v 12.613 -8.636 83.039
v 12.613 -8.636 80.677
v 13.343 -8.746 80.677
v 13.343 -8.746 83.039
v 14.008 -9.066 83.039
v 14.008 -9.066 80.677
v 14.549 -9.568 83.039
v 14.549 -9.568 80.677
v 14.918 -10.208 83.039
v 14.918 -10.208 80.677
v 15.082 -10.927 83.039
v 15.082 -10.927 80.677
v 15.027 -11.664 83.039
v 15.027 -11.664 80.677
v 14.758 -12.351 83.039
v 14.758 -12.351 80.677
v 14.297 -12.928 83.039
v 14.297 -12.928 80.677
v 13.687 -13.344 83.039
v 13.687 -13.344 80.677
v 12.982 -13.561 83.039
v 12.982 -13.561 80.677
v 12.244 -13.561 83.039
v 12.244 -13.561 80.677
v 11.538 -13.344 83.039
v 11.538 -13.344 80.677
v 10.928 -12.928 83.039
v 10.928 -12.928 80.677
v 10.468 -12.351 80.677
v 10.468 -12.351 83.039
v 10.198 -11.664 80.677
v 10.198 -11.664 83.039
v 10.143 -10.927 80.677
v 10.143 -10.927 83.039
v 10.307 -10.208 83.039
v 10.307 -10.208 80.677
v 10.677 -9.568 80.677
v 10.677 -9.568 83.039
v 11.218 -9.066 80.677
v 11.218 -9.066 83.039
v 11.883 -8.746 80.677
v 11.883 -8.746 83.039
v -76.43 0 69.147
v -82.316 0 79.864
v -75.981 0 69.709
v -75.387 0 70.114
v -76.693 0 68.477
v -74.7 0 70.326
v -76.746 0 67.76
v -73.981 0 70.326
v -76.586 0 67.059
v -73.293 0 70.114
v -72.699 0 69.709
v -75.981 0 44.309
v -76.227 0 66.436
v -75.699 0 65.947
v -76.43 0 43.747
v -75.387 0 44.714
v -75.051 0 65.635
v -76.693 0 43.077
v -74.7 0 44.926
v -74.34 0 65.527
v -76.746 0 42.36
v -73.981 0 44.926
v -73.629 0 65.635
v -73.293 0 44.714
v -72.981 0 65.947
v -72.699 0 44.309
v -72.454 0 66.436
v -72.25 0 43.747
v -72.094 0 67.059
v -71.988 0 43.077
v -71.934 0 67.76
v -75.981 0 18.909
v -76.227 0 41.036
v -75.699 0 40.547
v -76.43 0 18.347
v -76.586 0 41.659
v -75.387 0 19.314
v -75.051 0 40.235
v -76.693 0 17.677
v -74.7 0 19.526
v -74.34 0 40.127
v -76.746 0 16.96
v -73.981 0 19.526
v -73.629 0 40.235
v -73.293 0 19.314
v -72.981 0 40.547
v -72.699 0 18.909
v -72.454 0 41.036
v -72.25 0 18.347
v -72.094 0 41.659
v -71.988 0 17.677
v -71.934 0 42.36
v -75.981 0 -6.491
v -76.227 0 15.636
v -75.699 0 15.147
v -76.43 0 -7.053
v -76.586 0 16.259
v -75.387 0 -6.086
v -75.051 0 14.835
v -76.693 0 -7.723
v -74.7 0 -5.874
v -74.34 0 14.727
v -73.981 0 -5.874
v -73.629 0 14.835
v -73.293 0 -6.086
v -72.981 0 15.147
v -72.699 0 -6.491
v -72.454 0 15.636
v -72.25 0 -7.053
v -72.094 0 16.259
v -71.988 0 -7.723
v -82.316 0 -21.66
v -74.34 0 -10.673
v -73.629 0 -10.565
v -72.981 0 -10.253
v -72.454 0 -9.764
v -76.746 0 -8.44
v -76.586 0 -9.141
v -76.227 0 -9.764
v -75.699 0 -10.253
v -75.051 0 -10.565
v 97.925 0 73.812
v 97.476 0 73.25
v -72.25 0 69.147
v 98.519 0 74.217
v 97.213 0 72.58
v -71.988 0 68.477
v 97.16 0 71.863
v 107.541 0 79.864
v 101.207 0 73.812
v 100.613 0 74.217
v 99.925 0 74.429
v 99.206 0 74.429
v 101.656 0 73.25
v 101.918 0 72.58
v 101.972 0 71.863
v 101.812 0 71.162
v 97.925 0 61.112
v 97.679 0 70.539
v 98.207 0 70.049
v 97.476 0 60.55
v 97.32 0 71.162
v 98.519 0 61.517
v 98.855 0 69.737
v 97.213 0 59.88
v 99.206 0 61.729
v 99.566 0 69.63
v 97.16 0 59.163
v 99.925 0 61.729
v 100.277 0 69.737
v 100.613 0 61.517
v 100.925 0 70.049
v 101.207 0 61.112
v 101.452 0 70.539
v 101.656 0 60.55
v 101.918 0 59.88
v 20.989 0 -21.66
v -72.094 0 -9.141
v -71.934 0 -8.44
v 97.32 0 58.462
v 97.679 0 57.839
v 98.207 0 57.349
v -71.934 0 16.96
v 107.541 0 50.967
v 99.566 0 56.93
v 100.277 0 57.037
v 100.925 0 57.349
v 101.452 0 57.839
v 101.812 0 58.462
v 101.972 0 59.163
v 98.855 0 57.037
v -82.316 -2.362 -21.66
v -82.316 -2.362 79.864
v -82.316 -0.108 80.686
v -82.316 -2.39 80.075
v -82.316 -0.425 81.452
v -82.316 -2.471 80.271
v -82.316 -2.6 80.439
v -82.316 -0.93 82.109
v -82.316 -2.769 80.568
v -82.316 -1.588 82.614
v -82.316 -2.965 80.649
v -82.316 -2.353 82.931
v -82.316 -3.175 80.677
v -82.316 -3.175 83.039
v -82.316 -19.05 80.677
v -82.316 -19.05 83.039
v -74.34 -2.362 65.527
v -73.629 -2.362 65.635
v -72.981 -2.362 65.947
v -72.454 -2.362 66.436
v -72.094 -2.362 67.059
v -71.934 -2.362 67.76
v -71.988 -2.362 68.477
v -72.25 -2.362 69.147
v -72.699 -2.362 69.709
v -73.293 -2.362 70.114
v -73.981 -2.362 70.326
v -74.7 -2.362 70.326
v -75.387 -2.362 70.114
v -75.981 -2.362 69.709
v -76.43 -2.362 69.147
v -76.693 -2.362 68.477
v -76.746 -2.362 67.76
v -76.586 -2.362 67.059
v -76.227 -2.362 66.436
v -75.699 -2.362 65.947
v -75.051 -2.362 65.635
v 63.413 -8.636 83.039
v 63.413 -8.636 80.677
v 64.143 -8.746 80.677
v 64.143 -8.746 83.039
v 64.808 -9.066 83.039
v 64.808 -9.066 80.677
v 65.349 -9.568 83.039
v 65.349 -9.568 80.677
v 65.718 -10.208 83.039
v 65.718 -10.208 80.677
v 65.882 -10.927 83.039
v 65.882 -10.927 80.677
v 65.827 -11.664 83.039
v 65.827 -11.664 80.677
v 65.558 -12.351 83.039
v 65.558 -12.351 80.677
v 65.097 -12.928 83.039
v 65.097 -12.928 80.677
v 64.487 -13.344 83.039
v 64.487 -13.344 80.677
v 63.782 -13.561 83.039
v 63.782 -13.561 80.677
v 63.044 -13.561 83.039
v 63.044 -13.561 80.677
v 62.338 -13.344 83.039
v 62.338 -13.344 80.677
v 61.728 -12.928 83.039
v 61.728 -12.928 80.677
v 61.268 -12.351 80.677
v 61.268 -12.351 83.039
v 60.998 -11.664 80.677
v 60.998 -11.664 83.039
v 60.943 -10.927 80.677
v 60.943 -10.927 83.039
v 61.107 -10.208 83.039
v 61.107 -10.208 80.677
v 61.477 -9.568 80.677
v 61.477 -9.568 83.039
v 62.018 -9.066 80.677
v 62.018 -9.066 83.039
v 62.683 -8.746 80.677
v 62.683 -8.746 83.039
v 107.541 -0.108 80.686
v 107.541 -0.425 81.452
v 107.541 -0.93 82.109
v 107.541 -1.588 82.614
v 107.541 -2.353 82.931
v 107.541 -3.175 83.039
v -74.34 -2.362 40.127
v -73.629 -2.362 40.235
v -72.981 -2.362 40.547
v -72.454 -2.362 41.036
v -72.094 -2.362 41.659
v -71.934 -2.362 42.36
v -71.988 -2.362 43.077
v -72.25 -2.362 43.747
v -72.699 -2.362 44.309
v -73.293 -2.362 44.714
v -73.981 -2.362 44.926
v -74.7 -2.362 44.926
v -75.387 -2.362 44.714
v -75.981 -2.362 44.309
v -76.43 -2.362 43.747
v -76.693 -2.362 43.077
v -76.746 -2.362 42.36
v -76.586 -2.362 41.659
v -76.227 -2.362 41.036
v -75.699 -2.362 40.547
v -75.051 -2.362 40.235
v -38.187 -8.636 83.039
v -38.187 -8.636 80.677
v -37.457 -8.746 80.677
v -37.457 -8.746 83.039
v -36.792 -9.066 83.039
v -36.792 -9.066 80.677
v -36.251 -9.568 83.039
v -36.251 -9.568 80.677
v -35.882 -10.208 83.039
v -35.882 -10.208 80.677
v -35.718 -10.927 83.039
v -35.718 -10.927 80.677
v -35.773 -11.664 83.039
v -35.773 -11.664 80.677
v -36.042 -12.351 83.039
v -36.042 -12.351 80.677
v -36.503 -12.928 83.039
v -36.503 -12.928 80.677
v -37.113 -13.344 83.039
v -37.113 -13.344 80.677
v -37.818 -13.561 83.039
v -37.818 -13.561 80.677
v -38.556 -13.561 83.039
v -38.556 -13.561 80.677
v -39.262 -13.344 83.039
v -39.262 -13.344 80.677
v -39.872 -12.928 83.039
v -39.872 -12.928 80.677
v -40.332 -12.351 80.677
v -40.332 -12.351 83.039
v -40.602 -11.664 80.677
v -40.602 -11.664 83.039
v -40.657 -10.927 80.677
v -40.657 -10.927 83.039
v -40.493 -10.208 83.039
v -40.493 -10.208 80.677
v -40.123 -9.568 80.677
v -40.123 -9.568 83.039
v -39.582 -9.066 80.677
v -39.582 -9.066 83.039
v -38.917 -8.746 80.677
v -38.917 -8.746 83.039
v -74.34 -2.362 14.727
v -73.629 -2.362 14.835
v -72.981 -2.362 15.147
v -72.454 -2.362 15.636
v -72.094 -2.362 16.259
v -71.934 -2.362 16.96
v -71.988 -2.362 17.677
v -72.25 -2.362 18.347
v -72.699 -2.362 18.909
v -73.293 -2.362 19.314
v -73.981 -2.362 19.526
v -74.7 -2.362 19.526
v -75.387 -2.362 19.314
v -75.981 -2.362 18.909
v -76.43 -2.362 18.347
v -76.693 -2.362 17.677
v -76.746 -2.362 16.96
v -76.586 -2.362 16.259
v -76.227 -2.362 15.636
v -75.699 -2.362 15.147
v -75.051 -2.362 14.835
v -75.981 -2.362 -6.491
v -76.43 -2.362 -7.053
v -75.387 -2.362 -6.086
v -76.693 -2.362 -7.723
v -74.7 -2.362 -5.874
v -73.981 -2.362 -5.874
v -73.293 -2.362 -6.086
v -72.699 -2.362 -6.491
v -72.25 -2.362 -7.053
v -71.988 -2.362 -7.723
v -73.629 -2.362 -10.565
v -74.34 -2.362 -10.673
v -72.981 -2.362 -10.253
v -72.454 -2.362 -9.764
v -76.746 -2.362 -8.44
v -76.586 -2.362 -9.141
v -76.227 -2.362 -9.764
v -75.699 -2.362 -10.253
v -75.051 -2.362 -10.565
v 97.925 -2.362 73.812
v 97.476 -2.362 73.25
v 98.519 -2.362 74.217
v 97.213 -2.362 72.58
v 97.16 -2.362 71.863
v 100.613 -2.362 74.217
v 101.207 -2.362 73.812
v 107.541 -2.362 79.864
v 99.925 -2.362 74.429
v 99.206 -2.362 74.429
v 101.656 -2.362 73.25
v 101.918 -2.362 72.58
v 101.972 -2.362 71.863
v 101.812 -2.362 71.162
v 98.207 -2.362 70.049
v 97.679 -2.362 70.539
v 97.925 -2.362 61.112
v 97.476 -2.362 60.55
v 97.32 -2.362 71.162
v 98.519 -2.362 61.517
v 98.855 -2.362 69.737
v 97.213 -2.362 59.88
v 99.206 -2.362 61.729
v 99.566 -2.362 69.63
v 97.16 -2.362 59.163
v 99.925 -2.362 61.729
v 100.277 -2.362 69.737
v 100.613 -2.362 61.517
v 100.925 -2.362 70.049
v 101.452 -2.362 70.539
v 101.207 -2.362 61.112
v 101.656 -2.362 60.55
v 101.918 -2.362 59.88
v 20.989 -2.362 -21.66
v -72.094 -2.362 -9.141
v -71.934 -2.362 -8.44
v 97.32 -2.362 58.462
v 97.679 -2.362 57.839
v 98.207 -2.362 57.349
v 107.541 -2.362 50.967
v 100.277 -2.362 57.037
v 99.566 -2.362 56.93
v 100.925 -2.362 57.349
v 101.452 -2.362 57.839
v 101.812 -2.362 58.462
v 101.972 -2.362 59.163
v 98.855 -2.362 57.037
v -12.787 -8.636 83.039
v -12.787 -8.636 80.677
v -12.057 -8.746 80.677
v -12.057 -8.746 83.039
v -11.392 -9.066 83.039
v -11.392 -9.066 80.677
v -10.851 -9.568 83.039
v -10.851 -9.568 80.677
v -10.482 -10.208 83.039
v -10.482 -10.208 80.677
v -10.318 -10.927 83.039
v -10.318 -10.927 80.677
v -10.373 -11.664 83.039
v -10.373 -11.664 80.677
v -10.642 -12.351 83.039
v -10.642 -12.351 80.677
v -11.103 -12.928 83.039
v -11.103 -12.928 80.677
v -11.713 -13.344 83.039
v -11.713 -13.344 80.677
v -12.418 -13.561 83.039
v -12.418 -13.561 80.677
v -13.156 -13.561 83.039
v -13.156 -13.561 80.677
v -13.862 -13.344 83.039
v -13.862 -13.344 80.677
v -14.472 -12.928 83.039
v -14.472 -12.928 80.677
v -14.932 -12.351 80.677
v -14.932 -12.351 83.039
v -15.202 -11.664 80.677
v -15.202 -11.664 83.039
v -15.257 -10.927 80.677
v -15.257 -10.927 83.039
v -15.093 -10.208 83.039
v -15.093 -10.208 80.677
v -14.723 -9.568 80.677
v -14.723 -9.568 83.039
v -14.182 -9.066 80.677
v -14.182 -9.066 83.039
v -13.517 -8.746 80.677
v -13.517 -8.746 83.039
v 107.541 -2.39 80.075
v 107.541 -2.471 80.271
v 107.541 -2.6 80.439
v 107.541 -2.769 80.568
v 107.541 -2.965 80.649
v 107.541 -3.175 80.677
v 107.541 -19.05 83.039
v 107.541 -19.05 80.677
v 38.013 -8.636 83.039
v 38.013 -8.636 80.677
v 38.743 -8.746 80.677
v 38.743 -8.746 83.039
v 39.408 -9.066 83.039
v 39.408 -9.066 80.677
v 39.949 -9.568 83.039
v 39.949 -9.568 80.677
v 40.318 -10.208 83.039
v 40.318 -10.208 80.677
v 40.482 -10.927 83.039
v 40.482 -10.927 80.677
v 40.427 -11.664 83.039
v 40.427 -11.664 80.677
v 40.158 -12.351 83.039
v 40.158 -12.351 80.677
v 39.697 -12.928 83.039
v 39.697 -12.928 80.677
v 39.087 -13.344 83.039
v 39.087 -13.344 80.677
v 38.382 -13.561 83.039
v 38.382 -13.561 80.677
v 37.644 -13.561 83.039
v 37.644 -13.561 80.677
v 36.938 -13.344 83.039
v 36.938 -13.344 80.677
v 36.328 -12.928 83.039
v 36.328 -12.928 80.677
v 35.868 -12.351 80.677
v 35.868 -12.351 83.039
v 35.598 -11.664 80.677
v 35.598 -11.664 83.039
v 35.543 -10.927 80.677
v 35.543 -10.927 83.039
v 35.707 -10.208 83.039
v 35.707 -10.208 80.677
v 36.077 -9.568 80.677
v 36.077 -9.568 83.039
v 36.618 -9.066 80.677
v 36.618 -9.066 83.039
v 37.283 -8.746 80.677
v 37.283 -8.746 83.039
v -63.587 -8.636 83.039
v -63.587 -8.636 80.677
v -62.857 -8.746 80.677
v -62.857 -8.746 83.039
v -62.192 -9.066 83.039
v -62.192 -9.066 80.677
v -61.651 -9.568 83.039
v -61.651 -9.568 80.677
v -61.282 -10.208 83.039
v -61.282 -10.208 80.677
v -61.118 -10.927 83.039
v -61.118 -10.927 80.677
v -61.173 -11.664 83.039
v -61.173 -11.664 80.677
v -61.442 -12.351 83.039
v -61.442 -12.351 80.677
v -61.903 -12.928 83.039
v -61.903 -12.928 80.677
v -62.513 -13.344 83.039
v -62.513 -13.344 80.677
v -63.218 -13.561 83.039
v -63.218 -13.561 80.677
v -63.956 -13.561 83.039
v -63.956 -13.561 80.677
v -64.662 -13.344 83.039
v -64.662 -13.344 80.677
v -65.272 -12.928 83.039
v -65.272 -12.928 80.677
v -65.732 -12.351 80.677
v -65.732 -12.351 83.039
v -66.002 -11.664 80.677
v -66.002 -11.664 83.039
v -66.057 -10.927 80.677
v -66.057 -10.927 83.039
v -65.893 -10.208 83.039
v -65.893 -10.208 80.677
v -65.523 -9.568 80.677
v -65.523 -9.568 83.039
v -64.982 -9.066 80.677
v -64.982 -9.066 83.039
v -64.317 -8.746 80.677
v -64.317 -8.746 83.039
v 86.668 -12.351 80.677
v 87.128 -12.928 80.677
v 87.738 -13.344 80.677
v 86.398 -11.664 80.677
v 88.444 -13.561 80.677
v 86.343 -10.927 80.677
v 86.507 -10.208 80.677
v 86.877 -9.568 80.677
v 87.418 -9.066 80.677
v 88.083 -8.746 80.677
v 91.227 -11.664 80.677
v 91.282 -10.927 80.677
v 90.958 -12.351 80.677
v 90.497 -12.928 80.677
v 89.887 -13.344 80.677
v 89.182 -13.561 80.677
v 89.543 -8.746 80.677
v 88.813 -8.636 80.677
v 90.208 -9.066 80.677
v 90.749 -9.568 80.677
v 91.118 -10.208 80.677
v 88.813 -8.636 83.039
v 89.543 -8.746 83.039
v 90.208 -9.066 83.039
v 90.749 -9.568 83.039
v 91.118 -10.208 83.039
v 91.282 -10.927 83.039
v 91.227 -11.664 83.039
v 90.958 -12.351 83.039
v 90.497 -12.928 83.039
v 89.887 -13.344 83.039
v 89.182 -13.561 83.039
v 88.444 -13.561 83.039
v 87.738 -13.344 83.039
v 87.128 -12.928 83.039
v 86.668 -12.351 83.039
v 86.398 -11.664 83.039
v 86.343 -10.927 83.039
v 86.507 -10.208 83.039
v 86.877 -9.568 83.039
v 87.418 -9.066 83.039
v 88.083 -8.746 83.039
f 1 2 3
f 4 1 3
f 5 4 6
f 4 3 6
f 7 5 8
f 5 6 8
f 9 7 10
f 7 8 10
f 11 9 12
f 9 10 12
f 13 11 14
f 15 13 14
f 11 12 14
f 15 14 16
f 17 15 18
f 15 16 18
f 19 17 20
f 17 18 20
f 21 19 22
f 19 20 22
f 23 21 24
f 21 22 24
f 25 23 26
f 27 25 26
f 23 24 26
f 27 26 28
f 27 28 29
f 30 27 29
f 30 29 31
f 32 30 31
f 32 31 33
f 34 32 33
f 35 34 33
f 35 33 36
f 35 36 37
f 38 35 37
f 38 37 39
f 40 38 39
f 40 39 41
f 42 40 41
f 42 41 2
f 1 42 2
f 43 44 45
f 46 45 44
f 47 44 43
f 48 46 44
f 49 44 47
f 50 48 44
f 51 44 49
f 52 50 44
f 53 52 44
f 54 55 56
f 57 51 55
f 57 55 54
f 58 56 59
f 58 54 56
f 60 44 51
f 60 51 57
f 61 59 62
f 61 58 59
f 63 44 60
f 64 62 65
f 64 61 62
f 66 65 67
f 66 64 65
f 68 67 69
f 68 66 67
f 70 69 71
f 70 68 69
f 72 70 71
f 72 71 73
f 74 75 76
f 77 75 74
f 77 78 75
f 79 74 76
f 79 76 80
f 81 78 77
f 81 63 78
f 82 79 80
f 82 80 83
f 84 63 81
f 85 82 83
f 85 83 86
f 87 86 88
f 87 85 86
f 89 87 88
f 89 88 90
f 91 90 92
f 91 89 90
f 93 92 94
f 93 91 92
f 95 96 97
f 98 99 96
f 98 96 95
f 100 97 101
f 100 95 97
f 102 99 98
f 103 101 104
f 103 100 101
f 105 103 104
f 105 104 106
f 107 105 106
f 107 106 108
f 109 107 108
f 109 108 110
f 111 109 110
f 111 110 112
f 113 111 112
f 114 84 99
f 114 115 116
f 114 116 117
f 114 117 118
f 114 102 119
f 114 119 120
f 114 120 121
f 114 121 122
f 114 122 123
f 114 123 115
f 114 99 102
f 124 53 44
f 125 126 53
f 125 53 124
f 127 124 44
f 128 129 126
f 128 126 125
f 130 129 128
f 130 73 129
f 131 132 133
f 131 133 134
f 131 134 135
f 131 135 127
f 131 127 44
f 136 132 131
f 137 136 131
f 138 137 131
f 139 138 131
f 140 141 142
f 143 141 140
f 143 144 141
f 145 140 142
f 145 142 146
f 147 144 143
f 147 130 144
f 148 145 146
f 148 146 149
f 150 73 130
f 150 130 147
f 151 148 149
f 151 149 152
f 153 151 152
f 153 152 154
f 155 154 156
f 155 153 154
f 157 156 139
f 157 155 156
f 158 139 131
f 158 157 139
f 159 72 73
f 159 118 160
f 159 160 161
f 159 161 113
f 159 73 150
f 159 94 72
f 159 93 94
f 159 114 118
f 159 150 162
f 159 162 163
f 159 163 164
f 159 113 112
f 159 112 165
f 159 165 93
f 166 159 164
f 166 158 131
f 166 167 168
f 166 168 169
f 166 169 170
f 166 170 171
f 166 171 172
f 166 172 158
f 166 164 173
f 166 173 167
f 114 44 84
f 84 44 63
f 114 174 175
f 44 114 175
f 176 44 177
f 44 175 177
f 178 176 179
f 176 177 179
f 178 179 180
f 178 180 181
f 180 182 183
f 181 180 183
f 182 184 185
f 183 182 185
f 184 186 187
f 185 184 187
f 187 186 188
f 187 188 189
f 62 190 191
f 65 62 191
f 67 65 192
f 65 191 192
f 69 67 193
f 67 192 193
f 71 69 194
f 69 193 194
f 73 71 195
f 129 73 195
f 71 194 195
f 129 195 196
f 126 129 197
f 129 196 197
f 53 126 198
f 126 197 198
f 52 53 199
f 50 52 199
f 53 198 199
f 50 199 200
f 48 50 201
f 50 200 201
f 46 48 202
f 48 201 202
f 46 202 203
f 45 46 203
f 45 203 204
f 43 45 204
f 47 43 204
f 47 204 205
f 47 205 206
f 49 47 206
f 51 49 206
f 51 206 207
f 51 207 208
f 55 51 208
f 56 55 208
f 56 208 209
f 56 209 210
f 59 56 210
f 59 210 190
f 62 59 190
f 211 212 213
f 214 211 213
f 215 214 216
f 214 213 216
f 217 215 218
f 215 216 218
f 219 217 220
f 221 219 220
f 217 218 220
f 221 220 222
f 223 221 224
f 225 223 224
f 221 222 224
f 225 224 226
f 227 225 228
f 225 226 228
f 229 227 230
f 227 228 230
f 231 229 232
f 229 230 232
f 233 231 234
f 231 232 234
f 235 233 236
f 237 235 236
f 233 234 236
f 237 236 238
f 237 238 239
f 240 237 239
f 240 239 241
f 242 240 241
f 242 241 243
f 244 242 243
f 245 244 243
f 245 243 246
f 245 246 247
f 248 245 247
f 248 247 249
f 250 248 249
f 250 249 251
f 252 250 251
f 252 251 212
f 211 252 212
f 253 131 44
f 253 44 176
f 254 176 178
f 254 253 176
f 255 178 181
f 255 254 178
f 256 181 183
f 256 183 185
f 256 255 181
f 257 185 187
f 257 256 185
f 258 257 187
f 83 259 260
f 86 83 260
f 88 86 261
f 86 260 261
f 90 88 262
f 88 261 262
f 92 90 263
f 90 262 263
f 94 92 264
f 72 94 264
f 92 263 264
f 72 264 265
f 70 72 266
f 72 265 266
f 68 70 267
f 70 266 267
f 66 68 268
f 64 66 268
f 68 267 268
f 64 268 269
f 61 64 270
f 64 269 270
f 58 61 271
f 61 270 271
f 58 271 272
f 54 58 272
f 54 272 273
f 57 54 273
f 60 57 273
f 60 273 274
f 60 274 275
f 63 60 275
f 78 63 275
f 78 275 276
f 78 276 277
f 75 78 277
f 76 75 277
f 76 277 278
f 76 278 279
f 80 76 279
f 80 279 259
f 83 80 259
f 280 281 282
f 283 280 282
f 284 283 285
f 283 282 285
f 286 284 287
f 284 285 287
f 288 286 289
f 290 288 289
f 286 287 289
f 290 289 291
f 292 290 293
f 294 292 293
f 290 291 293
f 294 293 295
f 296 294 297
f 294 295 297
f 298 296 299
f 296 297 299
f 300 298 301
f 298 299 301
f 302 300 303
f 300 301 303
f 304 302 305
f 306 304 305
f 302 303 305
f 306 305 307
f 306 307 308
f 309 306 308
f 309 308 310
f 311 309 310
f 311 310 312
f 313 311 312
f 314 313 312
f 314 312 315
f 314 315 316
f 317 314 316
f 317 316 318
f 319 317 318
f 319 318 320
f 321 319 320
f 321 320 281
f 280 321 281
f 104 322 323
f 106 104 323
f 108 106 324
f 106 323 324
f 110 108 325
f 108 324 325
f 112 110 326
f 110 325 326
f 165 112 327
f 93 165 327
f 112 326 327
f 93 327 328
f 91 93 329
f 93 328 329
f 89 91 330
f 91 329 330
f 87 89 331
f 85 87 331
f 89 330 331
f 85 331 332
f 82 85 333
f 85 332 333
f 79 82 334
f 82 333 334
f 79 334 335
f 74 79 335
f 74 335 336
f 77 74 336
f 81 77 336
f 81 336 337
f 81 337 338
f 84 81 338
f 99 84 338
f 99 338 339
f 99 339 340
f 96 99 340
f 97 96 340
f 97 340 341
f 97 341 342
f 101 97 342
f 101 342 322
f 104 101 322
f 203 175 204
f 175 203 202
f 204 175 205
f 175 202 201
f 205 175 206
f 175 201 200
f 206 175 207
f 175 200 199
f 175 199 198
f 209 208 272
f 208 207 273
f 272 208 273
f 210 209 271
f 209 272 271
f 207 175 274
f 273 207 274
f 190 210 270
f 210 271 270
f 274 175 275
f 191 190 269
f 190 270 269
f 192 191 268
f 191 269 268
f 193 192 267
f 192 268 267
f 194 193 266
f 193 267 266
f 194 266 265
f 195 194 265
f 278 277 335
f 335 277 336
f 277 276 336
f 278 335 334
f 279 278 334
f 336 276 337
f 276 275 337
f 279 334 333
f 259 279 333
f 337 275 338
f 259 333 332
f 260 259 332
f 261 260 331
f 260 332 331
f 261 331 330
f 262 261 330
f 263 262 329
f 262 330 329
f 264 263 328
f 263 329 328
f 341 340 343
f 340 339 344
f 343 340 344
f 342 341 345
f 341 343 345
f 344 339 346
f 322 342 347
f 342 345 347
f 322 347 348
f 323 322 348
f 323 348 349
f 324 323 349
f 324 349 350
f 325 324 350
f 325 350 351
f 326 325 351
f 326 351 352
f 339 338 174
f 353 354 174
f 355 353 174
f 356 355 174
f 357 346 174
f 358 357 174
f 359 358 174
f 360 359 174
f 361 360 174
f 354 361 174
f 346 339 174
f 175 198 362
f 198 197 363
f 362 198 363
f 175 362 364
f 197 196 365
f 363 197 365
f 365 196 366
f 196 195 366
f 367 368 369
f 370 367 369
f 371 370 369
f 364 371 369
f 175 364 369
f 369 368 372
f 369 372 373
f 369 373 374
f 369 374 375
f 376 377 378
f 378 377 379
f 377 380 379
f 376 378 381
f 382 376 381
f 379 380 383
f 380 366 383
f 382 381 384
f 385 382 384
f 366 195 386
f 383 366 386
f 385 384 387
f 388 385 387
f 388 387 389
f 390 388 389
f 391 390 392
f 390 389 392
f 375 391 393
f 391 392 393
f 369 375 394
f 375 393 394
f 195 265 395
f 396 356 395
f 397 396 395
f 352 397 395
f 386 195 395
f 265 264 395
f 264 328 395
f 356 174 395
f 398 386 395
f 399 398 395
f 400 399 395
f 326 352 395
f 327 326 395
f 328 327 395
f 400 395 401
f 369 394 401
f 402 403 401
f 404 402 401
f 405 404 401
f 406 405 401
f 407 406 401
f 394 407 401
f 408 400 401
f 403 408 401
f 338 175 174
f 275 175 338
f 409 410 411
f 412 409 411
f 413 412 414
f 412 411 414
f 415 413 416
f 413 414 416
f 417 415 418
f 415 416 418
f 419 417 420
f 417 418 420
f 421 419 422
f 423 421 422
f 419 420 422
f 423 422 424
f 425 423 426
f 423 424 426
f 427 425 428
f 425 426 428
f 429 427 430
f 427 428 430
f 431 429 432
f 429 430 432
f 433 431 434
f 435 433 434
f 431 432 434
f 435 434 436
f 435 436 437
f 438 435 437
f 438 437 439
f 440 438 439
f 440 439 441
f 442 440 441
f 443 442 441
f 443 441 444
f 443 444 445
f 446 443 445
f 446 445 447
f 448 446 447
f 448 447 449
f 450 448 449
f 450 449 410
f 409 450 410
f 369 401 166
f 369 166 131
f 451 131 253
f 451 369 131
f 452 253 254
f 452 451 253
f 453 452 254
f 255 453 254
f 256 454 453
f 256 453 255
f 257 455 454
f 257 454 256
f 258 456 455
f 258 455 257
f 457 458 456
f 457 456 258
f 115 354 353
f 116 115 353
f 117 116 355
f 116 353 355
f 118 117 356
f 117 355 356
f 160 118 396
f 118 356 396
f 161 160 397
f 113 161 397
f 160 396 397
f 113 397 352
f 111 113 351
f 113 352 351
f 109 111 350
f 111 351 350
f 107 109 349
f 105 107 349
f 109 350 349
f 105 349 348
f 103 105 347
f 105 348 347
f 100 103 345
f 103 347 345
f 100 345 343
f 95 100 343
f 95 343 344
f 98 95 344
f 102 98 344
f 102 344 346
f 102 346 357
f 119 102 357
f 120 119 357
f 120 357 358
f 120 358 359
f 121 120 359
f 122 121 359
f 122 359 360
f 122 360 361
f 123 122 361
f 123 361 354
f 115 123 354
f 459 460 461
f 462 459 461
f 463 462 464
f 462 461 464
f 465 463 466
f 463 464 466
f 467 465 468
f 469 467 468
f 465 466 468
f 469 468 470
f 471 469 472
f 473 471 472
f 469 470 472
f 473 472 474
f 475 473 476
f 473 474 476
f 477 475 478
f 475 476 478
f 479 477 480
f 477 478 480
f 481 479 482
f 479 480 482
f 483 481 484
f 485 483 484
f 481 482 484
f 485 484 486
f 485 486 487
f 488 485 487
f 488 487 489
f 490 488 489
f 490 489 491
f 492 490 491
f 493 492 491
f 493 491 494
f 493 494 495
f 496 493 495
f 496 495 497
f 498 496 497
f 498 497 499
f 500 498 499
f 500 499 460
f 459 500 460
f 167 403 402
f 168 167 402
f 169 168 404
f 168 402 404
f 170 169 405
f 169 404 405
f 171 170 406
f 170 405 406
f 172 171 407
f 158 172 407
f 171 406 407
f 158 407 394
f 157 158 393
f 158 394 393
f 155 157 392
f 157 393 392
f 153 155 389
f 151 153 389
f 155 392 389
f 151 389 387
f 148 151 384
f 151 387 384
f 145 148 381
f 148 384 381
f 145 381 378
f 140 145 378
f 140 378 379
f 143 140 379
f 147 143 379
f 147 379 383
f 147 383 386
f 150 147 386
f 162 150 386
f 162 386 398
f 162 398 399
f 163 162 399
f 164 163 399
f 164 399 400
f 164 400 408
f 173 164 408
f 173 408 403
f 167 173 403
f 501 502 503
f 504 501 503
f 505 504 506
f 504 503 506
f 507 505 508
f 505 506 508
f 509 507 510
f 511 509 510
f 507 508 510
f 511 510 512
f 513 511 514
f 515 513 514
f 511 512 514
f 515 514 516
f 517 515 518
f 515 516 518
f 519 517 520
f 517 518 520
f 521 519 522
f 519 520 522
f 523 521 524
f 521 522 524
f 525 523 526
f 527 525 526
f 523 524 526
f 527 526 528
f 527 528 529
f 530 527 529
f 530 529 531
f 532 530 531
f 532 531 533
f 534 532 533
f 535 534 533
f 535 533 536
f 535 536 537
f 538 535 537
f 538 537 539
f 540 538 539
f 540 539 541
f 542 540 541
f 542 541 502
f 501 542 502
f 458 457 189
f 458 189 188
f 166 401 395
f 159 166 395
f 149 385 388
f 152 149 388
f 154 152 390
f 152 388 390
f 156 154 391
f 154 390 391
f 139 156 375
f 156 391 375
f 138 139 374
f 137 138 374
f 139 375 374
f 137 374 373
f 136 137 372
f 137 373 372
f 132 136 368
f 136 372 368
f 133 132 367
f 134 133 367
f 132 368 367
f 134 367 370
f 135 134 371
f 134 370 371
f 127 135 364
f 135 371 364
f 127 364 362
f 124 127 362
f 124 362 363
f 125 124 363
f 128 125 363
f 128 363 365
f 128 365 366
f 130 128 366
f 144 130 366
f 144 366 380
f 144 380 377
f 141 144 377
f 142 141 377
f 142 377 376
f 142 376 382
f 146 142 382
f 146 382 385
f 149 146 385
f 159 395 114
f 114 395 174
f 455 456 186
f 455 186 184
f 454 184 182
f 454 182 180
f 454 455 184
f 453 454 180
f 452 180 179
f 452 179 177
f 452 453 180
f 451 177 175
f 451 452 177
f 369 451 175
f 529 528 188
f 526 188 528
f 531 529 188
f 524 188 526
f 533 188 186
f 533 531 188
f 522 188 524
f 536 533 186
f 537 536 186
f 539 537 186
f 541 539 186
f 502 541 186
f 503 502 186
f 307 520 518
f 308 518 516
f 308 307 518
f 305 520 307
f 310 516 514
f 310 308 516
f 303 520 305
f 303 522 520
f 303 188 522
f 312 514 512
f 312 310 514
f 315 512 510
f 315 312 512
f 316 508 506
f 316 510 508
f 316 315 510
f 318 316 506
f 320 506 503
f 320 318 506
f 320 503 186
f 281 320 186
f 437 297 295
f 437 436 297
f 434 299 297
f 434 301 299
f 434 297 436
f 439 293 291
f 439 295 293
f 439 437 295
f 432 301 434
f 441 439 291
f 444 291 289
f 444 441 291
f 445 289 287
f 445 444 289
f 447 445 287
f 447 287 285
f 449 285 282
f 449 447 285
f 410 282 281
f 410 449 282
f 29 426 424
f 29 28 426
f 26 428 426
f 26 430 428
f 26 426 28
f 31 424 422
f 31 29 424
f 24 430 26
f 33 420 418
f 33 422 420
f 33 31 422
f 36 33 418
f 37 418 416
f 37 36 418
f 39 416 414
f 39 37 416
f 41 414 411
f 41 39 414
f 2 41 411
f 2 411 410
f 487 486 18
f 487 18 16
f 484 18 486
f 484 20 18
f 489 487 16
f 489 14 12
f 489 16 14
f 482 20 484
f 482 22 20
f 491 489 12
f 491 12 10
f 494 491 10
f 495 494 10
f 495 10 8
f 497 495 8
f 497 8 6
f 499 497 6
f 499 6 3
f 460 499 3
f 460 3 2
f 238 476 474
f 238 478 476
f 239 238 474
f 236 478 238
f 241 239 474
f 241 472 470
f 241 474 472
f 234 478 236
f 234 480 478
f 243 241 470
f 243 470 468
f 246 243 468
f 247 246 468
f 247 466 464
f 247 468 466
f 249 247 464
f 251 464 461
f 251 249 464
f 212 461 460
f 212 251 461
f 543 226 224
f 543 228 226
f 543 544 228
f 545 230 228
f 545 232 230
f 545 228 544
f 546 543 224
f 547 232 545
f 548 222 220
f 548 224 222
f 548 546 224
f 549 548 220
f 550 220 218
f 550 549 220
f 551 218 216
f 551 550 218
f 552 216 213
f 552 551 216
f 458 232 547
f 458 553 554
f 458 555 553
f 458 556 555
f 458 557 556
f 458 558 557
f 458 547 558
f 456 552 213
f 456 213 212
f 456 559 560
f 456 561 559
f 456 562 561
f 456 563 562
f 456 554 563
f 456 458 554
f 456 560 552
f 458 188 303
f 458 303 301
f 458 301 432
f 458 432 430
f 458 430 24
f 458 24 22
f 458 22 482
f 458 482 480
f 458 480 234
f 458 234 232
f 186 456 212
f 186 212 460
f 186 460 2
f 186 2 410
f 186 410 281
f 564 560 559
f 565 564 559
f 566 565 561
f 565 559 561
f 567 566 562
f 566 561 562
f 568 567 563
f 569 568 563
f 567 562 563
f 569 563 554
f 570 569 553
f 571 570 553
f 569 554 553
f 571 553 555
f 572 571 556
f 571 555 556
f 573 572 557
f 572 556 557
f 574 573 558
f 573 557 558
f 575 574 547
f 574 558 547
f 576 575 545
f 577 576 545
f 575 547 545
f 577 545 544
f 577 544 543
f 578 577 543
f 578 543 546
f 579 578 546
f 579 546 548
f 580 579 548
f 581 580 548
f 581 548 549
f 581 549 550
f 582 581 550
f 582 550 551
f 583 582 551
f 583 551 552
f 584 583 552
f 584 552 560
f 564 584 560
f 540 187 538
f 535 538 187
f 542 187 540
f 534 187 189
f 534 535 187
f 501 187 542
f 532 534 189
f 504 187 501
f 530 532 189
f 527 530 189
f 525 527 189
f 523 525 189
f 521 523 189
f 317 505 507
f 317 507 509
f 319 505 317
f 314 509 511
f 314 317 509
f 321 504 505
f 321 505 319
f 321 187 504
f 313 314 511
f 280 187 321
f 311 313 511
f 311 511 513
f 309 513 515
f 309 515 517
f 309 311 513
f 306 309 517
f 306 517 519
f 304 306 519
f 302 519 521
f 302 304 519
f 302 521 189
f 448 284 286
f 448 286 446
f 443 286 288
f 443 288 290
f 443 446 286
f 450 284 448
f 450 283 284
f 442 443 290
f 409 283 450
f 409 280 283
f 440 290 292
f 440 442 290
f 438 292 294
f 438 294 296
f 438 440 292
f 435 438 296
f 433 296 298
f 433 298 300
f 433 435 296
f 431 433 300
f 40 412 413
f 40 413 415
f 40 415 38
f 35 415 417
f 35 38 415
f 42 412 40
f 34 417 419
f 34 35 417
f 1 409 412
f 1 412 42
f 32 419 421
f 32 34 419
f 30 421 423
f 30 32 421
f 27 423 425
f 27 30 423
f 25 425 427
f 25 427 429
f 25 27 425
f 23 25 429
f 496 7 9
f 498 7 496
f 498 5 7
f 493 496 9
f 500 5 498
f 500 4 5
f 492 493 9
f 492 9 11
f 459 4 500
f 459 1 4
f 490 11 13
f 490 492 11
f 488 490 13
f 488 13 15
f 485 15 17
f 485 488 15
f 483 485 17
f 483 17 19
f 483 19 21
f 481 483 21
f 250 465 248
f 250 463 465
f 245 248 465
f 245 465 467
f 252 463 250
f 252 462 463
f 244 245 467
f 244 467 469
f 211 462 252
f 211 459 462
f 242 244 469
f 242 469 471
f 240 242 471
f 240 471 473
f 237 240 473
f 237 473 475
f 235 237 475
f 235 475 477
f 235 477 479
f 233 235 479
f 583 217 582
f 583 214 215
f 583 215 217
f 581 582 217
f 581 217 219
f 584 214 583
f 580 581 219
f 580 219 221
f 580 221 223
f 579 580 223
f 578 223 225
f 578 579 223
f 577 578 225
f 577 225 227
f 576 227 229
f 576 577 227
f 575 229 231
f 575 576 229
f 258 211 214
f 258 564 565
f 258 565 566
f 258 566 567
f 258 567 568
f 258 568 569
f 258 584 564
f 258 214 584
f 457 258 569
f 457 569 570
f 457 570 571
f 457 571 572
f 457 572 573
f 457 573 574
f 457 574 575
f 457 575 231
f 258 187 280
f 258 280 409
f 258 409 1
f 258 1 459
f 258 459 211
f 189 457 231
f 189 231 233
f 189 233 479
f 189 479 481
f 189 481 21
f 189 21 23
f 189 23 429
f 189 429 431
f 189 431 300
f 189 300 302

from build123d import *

# Parameters (mm, degrees)
SKETCH1_W                    = 189.8572
SKETCH1_H                    = 175.514
BASE_FLANGE1_DEPTH           = 2.3622
EDGE_FLANGE4_STRIP_W         = 11.0744
EDGE_FLANGE4_STRIP_H         = 2.3622
EDGE_FLANGE4_STRIP_CUT_DEPTH = 189.8572
EDGE_FLANGE4_DEPTH           = 189.8572
CUT_EXTRUDE1_DEPTH           = 145.352665205
CUT_EXTRUDE5_REACH           = 151.669
SKETCH41_R                   = 2.4765
CUT_EXTRUDE6_REACH           = 138.891
SKETCH42_R                   = 2.413


# Sheet-metal steps are written as plain solids
with BuildPart() as part:
    # Sketch1 → Base-Flange1 (new body)
    with BuildSketch(Plane(origin=(0, 0, 0), x_dir=(1, 0, 0), z_dir=(0, 1, 0))):
        with Locations((12.6128, 7.08)):
            Rectangle(SKETCH1_W, SKETCH1_H)
    extrude(amount=-BASE_FLANGE1_DEPTH)

    # Edge-Flange4 strip (across the edge) → Edge-Flange4 strip cut (cut)
    with BuildSketch(Plane(origin=(107.5414, -2.3622, 80.677), x_dir=(0, 0, -1), z_dir=(-1, 0, 0))):
        with Locations((-4.7244, -1.1811)):
            Rectangle(EDGE_FLANGE4_STRIP_W, EDGE_FLANGE4_STRIP_H)
    extrude(amount=EDGE_FLANGE4_STRIP_CUT_DEPTH, mode=Mode.SUBTRACT)

    # Edge-Flange4 section (across the edge) → Edge-Flange4 (add)
    with BuildSketch(Plane(origin=(107.5414, -2.3622, 80.677), x_dir=(0, 0, -1), z_dir=(-1, 0, 0))):
        with BuildLine():
            Line((-2.3622, 0.8128), (-2.3622, 16.6878))
            Line((-2.3622, 16.6878), (0, 16.6878))
            Line((0, 16.6878), (0, 0.8128))
            ThreePointArc((0, 0.8128), (0.238063608, 0.238063608), (0.8128, 0))
            Line((0.8128, 0), (0.8128, -2.3622))
            ThreePointArc((0.8128, -2.3622), (-1.43226403, -1.43226403), (-2.3622, 0.8128))
        make_face()
    extrude(amount=EDGE_FLANGE4_DEPTH)

    # Sketch36 → Cut-Extrude1 (cut, through all)
    with BuildSketch(Plane.XZ.offset(2.3622)):
        Polygon((20.98856689, -21.6596), (-82.3158, -21.6596), (-82.3158, -94.837), (107.5414, -94.837), (107.5414, 50.96685034), align=None)
    extrude(amount=-CUT_EXTRUDE1_DEPTH, mode=Mode.SUBTRACT)

    # Sketch41 → Cut-Extrude5 (cut, up to next)
    with BuildSketch(Plane(origin=(0, 0, 80.677), x_dir=(-1, 0, 0), z_dir=(0, 0, -1)), mode=Mode.PRIVATE) as cut_extrude5_sk1:
        with Locations(Location((-88.8128, -11.1125, 0), (0, 0, 90))):
            Circle(SKETCH41_R)
    cut_extrude5_tool1 = extrude(cut_extrude5_sk1.sketch, amount=-CUT_EXTRUDE5_REACH, mode=Mode.PRIVATE) & part.part
    # Sketch41 → Cut-Extrude5 (cut, up to next)
    with BuildSketch(Plane(origin=(0, 0, 80.677), x_dir=(-1, 0, 0), z_dir=(0, 0, -1)), mode=Mode.PRIVATE) as cut_extrude5_sk2:
        with Locations(Location((-63.4128, -11.1125, 0), (0, 0, 90))):
            Circle(SKETCH41_R)
    cut_extrude5_tool2 = extrude(cut_extrude5_sk2.sketch, amount=-CUT_EXTRUDE5_REACH, mode=Mode.PRIVATE) & part.part
    # Sketch41 → Cut-Extrude5 (cut, up to next)
    with BuildSketch(Plane(origin=(0, 0, 80.677), x_dir=(-1, 0, 0), z_dir=(0, 0, -1)), mode=Mode.PRIVATE) as cut_extrude5_sk3:
        with Locations(Location((-38.0128, -11.1125, 0), (0, 0, 90))):
            Circle(SKETCH41_R)
    cut_extrude5_tool3 = extrude(cut_extrude5_sk3.sketch, amount=-CUT_EXTRUDE5_REACH, mode=Mode.PRIVATE) & part.part
    # Sketch41 → Cut-Extrude5 (cut, up to next)
    with BuildSketch(Plane(origin=(0, 0, 80.677), x_dir=(-1, 0, 0), z_dir=(0, 0, -1)), mode=Mode.PRIVATE) as cut_extrude5_sk4:
        with Locations(Location((-12.6128, -11.1125, 0), (0, 0, 90))):
            Circle(SKETCH41_R)
    cut_extrude5_tool4 = extrude(cut_extrude5_sk4.sketch, amount=-CUT_EXTRUDE5_REACH, mode=Mode.PRIVATE) & part.part
    # Sketch41 → Cut-Extrude5 (cut, up to next)
    with BuildSketch(Plane(origin=(0, 0, 80.677), x_dir=(-1, 0, 0), z_dir=(0, 0, -1)), mode=Mode.PRIVATE) as cut_extrude5_sk5:
        with Locations(Location((12.7872, -11.1125, 0), (0, 0, 90))):
            Circle(SKETCH41_R)
    cut_extrude5_tool5 = extrude(cut_extrude5_sk5.sketch, amount=-CUT_EXTRUDE5_REACH, mode=Mode.PRIVATE) & part.part
    # Sketch41 → Cut-Extrude5 (cut, up to next)
    with BuildSketch(Plane(origin=(0, 0, 80.677), x_dir=(-1, 0, 0), z_dir=(0, 0, -1)), mode=Mode.PRIVATE) as cut_extrude5_sk6:
        with Locations(Location((38.1872, -11.1125, 0), (0, 0, 90))):
            Circle(SKETCH41_R)
    cut_extrude5_tool6 = extrude(cut_extrude5_sk6.sketch, amount=-CUT_EXTRUDE5_REACH, mode=Mode.PRIVATE) & part.part
    # Sketch41 → Cut-Extrude5 (cut, up to next)
    with BuildSketch(Plane(origin=(0, 0, 80.677), x_dir=(-1, 0, 0), z_dir=(0, 0, -1)), mode=Mode.PRIVATE) as cut_extrude5_sk7:
        with Locations(Location((63.5872, -11.1125, 0), (0, 0, 90))):
            Circle(SKETCH41_R)
    cut_extrude5_tool7 = extrude(cut_extrude5_sk7.sketch, amount=-CUT_EXTRUDE5_REACH, mode=Mode.PRIVATE) & part.part
    add(cut_extrude5_tool1.solids().sort_by_distance((88.8128, -11.1125, 80.677))[0], mode=Mode.SUBTRACT)
    add(cut_extrude5_tool2.solids().sort_by_distance((63.4128, -11.1125, 80.677))[0], mode=Mode.SUBTRACT)
    add(cut_extrude5_tool3.solids().sort_by_distance((38.0128, -11.1125, 80.677))[0], mode=Mode.SUBTRACT)
    add(cut_extrude5_tool4.solids().sort_by_distance((12.6128, -11.1125, 80.677))[0], mode=Mode.SUBTRACT)
    add(cut_extrude5_tool5.solids().sort_by_distance((-12.7872, -11.1125, 80.677))[0], mode=Mode.SUBTRACT)
    add(cut_extrude5_tool6.solids().sort_by_distance((-38.1872, -11.1125, 80.677))[0], mode=Mode.SUBTRACT)
    add(cut_extrude5_tool7.solids().sort_by_distance((-63.5872, -11.1125, 80.677))[0], mode=Mode.SUBTRACT)

    # Sketch42 → Cut-Extrude6 (cut, up to next)
    with BuildSketch(Plane.XZ.offset(2.3622), mode=Mode.PRIVATE) as cut_extrude6_sk1:
        with Locations(Location((-74.3402, -8.2596, 0), (0, 0, 270))):
            Circle(SKETCH42_R)
    cut_extrude6_tool1 = extrude(cut_extrude6_sk1.sketch, amount=-CUT_EXTRUDE6_REACH, mode=Mode.PRIVATE) & part.part
    # Sketch42 → Cut-Extrude6 (cut, up to next)
    with BuildSketch(Plane.XZ.offset(2.3622), mode=Mode.PRIVATE) as cut_extrude6_sk2:
        with Locations(Location((-74.3402, 17.1404, 0), (0, 0, 270))):
            Circle(SKETCH42_R)
    cut_extrude6_tool2 = extrude(cut_extrude6_sk2.sketch, amount=-CUT_EXTRUDE6_REACH, mode=Mode.PRIVATE) & part.part
    # Sketch42 → Cut-Extrude6 (cut, up to next)
    with BuildSketch(Plane.XZ.offset(2.3622), mode=Mode.PRIVATE) as cut_extrude6_sk3:
        with Locations(Location((-74.3402, 42.5404, 0), (0, 0, 270))):
            Circle(SKETCH42_R)
    cut_extrude6_tool3 = extrude(cut_extrude6_sk3.sketch, amount=-CUT_EXTRUDE6_REACH, mode=Mode.PRIVATE) & part.part
    # Sketch42 → Cut-Extrude6 (cut, up to next)
    with BuildSketch(Plane.XZ.offset(2.3622), mode=Mode.PRIVATE) as cut_extrude6_sk4:
        with Locations(Location((-74.3402, 67.9404, 0), (0, 0, 270))):
            Circle(SKETCH42_R)
    cut_extrude6_tool4 = extrude(cut_extrude6_sk4.sketch, amount=-CUT_EXTRUDE6_REACH, mode=Mode.PRIVATE) & part.part
    # Sketch42 → Cut-Extrude6 (cut, up to next)
    with BuildSketch(Plane.XZ.offset(2.3622), mode=Mode.PRIVATE) as cut_extrude6_sk5:
        with Locations(Location((99.5658, 59.3432, 0), (0, 0, 270))):
            Circle(SKETCH42_R)
    cut_extrude6_tool5 = extrude(cut_extrude6_sk5.sketch, amount=-CUT_EXTRUDE6_REACH, mode=Mode.PRIVATE) & part.part
    # Sketch42 → Cut-Extrude6 (cut, up to next)
    with BuildSketch(Plane.XZ.offset(2.3622), mode=Mode.PRIVATE) as cut_extrude6_sk6:
        with Locations(Location((99.5658, 72.0432, 0), (0, 0, 270))):
            Circle(SKETCH42_R)
    cut_extrude6_tool6 = extrude(cut_extrude6_sk6.sketch, amount=-CUT_EXTRUDE6_REACH, mode=Mode.PRIVATE) & part.part
    add(cut_extrude6_tool1.solids().sort_by_distance((-74.3402, -2.3622, -8.2596))[0], mode=Mode.SUBTRACT)
    add(cut_extrude6_tool2.solids().sort_by_distance((-74.3402, -2.3622, 17.1404))[0], mode=Mode.SUBTRACT)
    add(cut_extrude6_tool3.solids().sort_by_distance((-74.3402, -2.3622, 42.5404))[0], mode=Mode.SUBTRACT)
    add(cut_extrude6_tool4.solids().sort_by_distance((-74.3402, -2.3622, 67.9404))[0], mode=Mode.SUBTRACT)
    add(cut_extrude6_tool5.solids().sort_by_distance((99.5658, -2.3622, 59.3432))[0], mode=Mode.SUBTRACT)
    add(cut_extrude6_tool6.solids().sort_by_distance((99.5658, -2.3622, 72.0432))[0], mode=Mode.SUBTRACT)


solid = part.part
